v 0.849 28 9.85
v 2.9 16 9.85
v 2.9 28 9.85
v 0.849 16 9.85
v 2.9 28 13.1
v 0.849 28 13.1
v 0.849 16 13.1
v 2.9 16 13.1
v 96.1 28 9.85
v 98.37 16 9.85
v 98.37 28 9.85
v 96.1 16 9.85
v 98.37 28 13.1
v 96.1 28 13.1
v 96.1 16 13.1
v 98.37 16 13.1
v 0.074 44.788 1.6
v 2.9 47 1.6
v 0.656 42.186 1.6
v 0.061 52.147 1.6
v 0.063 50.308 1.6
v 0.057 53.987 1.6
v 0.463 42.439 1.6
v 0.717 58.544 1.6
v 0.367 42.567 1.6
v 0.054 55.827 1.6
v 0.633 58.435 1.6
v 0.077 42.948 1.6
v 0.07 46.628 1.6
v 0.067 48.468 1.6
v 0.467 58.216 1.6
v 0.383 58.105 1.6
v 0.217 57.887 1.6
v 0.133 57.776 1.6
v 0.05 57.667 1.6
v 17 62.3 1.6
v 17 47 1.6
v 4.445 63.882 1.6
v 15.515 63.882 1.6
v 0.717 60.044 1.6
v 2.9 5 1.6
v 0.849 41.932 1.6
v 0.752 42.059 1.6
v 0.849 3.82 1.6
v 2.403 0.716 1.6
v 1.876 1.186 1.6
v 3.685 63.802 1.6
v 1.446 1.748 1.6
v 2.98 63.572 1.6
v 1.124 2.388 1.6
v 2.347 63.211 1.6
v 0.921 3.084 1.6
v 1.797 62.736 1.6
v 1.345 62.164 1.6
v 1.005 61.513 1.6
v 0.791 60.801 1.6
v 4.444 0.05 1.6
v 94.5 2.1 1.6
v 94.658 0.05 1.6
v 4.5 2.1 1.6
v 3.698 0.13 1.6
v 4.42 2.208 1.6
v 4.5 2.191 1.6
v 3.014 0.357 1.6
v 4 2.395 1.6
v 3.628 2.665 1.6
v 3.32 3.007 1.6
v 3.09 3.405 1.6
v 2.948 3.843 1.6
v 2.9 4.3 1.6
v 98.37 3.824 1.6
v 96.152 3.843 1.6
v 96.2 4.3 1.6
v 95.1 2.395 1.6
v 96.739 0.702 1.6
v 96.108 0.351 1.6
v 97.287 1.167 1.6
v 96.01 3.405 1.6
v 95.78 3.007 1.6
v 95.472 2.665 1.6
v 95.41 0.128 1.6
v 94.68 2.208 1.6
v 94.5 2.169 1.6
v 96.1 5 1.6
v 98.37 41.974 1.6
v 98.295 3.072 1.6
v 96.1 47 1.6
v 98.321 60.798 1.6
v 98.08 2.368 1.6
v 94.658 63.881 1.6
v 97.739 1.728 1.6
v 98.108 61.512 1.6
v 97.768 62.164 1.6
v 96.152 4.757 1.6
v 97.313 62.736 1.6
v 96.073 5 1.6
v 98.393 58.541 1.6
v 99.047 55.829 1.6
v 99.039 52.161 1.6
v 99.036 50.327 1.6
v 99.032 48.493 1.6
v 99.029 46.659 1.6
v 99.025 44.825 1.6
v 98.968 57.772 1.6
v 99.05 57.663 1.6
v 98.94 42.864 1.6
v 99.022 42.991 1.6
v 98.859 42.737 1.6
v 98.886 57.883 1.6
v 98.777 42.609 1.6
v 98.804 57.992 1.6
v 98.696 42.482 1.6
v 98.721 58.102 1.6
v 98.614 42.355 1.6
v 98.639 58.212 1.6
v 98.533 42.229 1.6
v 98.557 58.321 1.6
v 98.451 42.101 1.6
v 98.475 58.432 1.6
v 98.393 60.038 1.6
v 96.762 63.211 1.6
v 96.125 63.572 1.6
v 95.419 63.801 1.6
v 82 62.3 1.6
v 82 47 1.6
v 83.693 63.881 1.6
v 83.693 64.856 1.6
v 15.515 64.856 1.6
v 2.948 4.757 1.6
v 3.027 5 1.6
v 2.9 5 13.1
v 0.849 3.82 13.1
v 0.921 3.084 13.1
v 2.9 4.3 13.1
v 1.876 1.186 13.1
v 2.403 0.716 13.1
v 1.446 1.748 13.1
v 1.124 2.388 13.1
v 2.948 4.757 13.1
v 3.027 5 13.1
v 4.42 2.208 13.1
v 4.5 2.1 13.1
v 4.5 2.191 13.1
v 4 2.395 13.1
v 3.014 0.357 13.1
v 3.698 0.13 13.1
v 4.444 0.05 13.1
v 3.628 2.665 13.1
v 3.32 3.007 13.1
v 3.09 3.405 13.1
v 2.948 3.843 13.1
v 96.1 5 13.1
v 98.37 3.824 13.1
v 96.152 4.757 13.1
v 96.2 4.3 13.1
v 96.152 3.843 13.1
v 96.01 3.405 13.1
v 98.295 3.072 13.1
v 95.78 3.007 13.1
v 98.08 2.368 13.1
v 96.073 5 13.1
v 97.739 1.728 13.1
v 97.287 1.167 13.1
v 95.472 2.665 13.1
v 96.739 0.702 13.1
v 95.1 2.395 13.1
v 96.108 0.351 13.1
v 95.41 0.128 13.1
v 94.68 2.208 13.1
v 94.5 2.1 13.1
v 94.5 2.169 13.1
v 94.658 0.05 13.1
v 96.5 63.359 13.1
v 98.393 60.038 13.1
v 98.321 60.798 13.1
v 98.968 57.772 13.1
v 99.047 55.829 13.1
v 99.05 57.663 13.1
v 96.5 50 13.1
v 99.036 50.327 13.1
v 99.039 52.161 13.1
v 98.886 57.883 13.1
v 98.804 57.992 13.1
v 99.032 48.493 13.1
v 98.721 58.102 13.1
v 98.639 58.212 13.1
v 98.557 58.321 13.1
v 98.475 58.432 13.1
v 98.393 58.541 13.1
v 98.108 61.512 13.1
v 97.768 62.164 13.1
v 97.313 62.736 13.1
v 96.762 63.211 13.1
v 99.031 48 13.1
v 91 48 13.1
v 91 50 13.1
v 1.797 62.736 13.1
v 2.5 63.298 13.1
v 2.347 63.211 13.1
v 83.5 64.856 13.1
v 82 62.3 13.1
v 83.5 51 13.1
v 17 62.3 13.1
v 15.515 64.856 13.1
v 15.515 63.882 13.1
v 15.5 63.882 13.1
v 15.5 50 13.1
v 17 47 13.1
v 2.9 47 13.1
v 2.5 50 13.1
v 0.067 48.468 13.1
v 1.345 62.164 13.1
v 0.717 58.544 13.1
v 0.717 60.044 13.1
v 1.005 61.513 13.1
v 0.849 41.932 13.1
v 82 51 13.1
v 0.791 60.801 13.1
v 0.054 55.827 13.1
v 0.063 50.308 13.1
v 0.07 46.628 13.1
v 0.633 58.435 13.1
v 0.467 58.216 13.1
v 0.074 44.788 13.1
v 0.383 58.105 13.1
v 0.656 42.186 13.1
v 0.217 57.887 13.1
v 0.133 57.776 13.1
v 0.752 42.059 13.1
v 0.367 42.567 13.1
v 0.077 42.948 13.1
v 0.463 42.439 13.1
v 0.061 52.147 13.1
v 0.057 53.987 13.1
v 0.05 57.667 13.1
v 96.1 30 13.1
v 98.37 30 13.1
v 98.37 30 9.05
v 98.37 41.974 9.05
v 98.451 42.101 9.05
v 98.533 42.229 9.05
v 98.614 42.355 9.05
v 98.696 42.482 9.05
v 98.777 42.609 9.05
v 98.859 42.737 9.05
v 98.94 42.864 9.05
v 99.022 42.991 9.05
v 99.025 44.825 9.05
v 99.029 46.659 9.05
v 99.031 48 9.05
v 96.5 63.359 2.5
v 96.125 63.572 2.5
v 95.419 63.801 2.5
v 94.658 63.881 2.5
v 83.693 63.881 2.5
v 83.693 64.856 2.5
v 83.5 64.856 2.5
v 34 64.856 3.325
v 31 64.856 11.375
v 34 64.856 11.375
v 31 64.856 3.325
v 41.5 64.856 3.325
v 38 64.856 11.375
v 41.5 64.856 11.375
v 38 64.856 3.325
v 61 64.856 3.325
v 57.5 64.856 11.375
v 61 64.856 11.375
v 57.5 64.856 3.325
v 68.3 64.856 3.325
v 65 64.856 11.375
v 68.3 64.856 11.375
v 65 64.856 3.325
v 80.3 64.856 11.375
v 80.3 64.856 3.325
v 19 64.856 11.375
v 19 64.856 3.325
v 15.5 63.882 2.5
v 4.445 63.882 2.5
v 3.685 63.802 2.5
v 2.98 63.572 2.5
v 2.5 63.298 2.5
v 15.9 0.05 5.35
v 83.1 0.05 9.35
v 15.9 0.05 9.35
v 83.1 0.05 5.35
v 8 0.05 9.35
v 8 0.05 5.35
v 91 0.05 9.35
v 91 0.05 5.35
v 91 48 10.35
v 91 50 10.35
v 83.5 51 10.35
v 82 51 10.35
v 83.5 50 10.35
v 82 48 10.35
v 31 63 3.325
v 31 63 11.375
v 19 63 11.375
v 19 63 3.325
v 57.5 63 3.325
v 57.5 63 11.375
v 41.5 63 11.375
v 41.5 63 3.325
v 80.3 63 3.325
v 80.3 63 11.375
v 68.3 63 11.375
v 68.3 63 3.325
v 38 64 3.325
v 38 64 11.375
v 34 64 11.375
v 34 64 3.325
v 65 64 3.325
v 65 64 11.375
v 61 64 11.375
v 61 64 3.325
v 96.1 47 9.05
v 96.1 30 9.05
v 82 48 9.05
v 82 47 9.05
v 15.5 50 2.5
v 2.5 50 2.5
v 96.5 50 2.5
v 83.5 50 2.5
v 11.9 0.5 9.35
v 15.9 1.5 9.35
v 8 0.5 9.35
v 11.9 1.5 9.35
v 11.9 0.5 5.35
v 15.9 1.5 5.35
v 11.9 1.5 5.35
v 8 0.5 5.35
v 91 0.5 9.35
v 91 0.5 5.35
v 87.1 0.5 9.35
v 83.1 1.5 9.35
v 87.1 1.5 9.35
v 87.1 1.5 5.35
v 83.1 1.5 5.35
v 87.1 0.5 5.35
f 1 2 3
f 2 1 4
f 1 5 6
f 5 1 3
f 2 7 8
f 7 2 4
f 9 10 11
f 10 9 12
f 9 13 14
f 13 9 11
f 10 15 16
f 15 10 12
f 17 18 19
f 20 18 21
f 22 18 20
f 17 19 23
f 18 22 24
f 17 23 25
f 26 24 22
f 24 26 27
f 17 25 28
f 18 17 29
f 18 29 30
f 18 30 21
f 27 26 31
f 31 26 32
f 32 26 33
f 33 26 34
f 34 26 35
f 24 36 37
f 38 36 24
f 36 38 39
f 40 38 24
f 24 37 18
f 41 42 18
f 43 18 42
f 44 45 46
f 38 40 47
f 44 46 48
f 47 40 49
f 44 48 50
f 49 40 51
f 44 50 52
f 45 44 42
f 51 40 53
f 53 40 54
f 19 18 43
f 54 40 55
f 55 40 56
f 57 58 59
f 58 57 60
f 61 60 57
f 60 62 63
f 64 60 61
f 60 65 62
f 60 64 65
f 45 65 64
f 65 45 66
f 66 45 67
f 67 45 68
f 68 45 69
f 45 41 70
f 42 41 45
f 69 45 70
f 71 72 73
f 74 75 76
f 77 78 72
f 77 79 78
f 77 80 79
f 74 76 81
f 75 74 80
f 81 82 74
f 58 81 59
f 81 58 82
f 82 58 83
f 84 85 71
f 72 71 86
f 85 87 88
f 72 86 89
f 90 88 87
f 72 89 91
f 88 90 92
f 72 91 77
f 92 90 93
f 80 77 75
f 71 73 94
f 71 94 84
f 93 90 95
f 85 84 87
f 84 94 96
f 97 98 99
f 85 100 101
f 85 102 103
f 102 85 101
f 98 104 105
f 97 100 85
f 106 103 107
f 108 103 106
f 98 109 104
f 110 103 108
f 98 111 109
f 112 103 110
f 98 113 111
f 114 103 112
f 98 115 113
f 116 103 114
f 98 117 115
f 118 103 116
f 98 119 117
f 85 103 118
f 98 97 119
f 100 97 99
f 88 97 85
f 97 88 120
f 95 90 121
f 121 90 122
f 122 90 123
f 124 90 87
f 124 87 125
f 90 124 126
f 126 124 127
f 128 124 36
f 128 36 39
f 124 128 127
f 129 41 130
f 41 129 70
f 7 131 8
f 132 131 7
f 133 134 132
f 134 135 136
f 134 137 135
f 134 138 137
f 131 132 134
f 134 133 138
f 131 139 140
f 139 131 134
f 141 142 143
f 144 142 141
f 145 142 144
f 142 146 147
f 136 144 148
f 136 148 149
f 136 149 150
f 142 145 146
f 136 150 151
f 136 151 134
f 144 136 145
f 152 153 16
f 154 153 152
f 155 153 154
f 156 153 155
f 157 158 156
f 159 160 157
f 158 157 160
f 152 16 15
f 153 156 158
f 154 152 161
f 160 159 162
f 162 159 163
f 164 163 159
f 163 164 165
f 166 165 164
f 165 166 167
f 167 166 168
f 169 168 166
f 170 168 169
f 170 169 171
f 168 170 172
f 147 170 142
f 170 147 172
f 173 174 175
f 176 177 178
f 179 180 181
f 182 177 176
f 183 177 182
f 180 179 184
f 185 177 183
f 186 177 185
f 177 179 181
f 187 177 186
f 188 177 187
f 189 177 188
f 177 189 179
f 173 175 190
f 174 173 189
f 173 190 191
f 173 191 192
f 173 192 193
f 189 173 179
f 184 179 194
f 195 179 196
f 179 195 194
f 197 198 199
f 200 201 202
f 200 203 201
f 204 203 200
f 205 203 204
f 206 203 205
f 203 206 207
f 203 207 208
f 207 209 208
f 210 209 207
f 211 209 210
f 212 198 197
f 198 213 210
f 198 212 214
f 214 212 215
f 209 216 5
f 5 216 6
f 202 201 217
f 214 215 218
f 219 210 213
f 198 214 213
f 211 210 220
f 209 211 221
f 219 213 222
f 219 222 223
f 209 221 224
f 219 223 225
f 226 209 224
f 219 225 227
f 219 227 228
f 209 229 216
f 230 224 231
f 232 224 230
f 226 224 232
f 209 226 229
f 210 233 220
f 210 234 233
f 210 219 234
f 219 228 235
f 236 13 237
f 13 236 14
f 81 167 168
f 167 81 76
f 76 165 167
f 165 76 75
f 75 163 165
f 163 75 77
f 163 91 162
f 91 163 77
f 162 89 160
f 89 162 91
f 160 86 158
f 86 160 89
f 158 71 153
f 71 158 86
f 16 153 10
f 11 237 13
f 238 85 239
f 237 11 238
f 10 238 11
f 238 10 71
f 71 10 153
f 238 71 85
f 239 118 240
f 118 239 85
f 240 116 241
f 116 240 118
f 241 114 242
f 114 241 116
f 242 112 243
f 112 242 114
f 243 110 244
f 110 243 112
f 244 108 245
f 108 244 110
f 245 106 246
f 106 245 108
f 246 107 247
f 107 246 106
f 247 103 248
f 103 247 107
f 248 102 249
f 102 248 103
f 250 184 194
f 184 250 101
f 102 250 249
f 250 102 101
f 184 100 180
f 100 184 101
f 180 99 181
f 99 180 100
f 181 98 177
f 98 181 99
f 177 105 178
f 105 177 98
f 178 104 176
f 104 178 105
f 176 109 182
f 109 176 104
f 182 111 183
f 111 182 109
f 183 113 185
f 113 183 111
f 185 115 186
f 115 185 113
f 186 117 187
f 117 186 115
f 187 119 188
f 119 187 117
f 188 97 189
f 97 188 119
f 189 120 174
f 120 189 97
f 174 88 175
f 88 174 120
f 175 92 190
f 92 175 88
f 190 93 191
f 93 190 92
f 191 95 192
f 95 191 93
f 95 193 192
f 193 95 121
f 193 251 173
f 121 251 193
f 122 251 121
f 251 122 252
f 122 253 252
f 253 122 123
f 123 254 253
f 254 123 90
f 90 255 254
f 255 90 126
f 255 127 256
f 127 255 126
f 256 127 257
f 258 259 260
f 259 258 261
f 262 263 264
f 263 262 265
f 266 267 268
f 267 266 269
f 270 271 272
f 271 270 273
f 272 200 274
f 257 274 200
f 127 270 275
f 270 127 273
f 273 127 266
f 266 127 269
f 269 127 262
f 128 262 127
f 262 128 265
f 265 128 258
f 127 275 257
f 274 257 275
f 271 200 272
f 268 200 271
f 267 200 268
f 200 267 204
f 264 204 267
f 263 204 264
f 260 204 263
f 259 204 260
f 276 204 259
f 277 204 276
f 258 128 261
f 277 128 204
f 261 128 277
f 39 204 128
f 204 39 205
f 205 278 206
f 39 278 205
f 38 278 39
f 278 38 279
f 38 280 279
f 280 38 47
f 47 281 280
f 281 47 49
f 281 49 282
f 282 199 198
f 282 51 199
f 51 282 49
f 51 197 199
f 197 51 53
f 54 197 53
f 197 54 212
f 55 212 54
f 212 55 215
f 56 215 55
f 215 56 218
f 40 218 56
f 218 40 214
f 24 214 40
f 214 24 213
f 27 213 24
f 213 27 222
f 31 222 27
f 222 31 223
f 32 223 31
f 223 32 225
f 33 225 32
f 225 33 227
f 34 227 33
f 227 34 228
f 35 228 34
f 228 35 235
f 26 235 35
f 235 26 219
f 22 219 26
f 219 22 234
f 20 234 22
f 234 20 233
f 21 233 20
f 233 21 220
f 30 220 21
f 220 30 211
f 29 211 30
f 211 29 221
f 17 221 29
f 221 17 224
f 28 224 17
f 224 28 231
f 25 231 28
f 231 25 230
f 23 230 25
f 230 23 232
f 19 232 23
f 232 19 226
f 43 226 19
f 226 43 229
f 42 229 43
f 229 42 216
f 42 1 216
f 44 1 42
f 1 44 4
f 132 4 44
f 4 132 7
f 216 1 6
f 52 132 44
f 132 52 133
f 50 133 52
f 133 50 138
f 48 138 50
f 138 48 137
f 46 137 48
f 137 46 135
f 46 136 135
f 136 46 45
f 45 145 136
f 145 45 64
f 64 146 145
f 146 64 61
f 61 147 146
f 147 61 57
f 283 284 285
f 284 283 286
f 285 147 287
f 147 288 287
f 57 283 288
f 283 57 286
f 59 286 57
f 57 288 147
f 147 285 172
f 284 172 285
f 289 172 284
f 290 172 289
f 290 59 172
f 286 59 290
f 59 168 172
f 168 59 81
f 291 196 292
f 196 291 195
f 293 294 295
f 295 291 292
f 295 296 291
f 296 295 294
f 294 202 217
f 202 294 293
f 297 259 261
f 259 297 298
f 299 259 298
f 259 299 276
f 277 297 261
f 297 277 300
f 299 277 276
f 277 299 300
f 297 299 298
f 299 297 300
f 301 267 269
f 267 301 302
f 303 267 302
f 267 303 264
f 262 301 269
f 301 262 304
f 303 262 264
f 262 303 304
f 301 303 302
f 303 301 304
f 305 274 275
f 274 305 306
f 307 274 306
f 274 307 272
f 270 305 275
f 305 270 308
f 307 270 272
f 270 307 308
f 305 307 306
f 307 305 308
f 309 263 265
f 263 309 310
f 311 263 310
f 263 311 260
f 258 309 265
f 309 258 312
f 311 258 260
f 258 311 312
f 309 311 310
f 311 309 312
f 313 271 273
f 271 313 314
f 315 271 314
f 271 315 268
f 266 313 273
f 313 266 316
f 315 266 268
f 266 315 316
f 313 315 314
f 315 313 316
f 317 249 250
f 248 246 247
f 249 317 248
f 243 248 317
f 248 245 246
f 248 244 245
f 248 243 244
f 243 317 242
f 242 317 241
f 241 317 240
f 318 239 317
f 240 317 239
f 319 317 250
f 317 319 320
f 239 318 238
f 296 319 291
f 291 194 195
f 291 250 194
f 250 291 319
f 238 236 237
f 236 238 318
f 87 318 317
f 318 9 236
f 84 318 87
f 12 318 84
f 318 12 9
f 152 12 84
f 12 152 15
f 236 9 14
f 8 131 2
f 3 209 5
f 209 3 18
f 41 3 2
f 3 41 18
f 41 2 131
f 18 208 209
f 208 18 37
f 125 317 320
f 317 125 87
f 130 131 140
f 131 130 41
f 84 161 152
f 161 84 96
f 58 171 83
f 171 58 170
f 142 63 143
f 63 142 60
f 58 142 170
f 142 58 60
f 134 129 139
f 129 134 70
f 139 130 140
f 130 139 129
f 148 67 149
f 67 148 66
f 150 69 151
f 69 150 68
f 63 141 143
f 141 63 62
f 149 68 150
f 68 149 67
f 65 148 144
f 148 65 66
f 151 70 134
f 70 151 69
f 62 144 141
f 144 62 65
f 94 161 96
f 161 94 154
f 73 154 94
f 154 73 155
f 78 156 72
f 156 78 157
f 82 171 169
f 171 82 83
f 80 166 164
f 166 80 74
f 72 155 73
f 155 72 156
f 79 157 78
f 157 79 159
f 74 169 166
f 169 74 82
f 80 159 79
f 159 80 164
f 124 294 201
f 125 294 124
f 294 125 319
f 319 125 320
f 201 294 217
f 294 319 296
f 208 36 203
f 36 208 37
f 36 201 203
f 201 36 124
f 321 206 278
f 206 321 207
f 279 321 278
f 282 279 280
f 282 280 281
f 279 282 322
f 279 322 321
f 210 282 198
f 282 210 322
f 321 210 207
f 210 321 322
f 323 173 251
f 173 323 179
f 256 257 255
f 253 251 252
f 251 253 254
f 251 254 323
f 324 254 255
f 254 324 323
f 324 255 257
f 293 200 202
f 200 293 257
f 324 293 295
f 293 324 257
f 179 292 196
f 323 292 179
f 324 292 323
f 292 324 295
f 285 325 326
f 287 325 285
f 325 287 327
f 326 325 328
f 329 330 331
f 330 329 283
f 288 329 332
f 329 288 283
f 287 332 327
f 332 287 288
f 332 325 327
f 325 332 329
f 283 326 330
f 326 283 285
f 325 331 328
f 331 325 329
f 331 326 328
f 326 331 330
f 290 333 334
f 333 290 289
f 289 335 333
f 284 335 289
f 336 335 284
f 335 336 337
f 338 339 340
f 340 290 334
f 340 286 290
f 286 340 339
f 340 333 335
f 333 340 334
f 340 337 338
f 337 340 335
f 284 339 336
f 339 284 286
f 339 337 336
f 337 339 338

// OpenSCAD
////// MixTape 3d Printed Case///////////////////////////

// thanks for adding the wall thickness, Philip!

// 

plugHeight = 10.6; // [6:11]
tapeHeight = 11.5; //
topThickness = 1.6; 
screwHoleSize = 1;

bottom_wall_thickness = 2;

usb_charger = false;
cutout_aux_ports = true;
volume_wheel = true;
screws_port = false;

//rotate([55,0,$t*380]) translate([-50,0,0]){
rotate([0,0,0]) translate([0,0,0]){
//PCB();
//parts();

difference(){
    
    union(){
        tapeBody_screws();
        //tapeTop_screws();
        //FullCase();
    }
    
    // Plugs 
    translate([2.5,50,tapeHeight-plugHeight+topThickness]) cube([13,20,plugHeight+1],false); 
    translate([83.5,50,tapeHeight-plugHeight+topThickness]) cube([13,20,plugHeight+1],false);
    
    // write protectors 
    translate([10,0,0.5*tapeHeight+1.6]) cube([4,1,4],true);
    translate([13.9,0,0.5*tapeHeight+1.6]) cube([4,3,4],true);
    translate([89,0,0.5*tapeHeight+1.6]) cube([4,1,4],true);
    translate([85.1,0,0.5*tapeHeight+1.6]) cube([4,3,4],true);

    // Power signs
    //if (!usb_charger) {
    //    translate([41,0,0.5*tapeHeight+1.6]) cube([4,1.5,1],true);
    //    translate([41,0,0.5*tapeHeight+1.6]) cube([1,1.5,4],true);
    
    //    translate([58,0,0.5*tapeHeight+1.6]) cube([4,1.5,1],true); 
    //}
}
}


module tapeBody_screws(){
    
    difference(){
        tapeBody();
        //screwHolebtop();
        //screwHolebottom();
        //speakerHole();
    }
}   
module tapeTop_screws(){
    difference(){
        tapeTop();
        screwHolebtopcover();
        screwHolebtop();
        screwHolebottom();
    }    
}   


// Modules ///////////////////////////////

module speakerHole(){   
    translate([0,18,tapeHeight/2 + topThickness])    
    for(z=[-180:45:+180])
      for(x=[4:3:12])
        rotate([90,z,90]) translate([x*0.45,0,0]) cylinder(h=10, r=0.4, $fn=30);
}


module PCB(){
color("DarkKhaki") 
translate ([0,0,tapeHeight+1.6]) linear_extrude(height = 1.6, center = false, convexity = 10, twist = 0) import("mixtape_case_3D_bottom.dxf", convexity=3);
color("Gold") 
translate ([0,0,tapeHeight+3.2]) linear_extrude(height = 0.2, center = false, convexity = 10, twist = 0) import("mixtape_case_3D_PCB.dxf", convexity=3);

color("DarkKhaki") 
translate ([0,0,tapeHeight+2*topThickness]) linear_extrude(height = 1.6, center = false, convexity = 10, twist = 0) import("mixtape_case_3D_PCB_TrapezBoard.dxf", convexity=3);
color("Gold") 
translate ([0,0,tapeHeight+3*topThickness]) linear_extrude(height = 0.2, center = false, convexity = 10, twist = 0) import("mixtape_case_3D_PCB_TrapezCircuit.dxf", convexity=3);
}

module tapeBody(){ 
    difference(){
        union(){
            difference(){ 
                //color("Deeppink") 
                translate ([0,0,1.6]) linear_extrude(height = tapeHeight, center = false, convexity = 10, twist = 0) import("mixtape_case_3D_bottom.dxf", convexity=3);  

                //if (!usb_charger) {
                    //translate ([0,0,0.6]) linear_extrude(height = tapeHeight+4, center = false, convexity = 10, twist = 0) import("mixtape_case_3D_MainCase.dxf", convexity=3);
                //} else {
                    //translate ([0,0,0.6]) linear_extrude(height = tapeHeight+4, center = false, convexity = 10, twist = 0) import("mixtape_case_3D_MainCase_USB.dxf", convexity=3);
                //}
                // cut out for SMD parts below
            translate([86,48,1*tapeHeight+topThickness+3]) cube([10,6,tapeHeight],true);
                
                //Face holes
                translate([25,64,0.5*tapeHeight+topThickness]) cube([12,2,0.7*tapeHeight],true);
                if (!usb_charger) { 
                    translate([49.5,64,0.5*tapeHeight+topThickness]) cube([16,2,0.7*tapeHeight],true); 
                }
                translate([74.3,64,0.5*tapeHeight+topThickness]) cube([12,2,0.7*tapeHeight],true);

                translate([36,65,0.5*tapeHeight+topThickness]) cube([4,2,0.7*tapeHeight],true);
                translate([63,65,0.5*tapeHeight+topThickness]) cube([4,2,0.7*tapeHeight],true);

                if (usb_charger) {
                    // cutout usb port
                    translate([49.5,64,0.5*tapeHeight+topThickness+3])cube([20,14,0.7*tapeHeight+4],true);
                }

                // Side Aux Ports
                if (cutout_aux_ports) {
                   translate([1.5,22,0.8*tapeHeight+topThickness+4.8]) cube([20,12,tapeHeight],true);
                   translate([90,22,0.8*tapeHeight+topThickness+4.8]) cube([20,12,tapeHeight],true);      
                }
                
                // Volume Wheel
                if (volume_wheel) {
                    translate([90,39,0.8*tapeHeight+topThickness+4]) cube([20,18,tapeHeight],true);      
                }
            }
            translate([49.5,7.05,0.5*tapeHeight+topThickness]) cube([90,14,1*tapeHeight],true);
            
        } //end union
        
        
    // wall thickness
        translate([49.5,24+bottom_wall_thickness,0.5*tapeHeight+topThickness-1]) cube([93.2,42,1*tapeHeight+7],true);
        
    translate([49.5,1.8+bottom_wall_thickness,0.5*tapeHeight+topThickness-1]) cube([90,3.4,1*tapeHeight+7],true);
    
    translate([5.1, 4.3 + 0, tapeHeight+topThickness-(tapeHeight)-1   ]) cylinder(h=tapeHeight*1.5, r=2.2, center=false, ,$fn=30);
    translate([94, 4.3 + 0, tapeHeight+topThickness-(tapeHeight)-1   ]) cylinder(h=tapeHeight*1.5, r=2.2, center=false, ,$fn=30);  
        
        translate([49.5,40+bottom_wall_thickness+2.8,0.5*tapeHeight+topThickness-1]) cube([65,35,0.7*tapeHeight+7],true);
    } // end difference
    
    
    
    //color("DarkKhaki") 
    if (!usb_charger) {
    //translate([40,0.05,1.6]) cube([20,10,2.5],false);
    }
    
    //screw left
    if (screws_port){
  translate([4 - 0 , 46.640 + 0, tapeHeight+topThickness-(tapeHeight)   ]) cylinder(h=tapeHeight*1, r=2.8, center=false, ,$fn=30);   
  translate([95 - 0 , 46.640 + 0, tapeHeight+topThickness-(tapeHeight)   ]) cylinder(h=tapeHeight*1, r=2.8, center=false, ,$fn=30); 
  translate([4 - 0 , 2.80 + 0, tapeHeight+topThickness-(tapeHeight)   ]) cylinder(h=tapeHeight*1, r=2.5, center=false, ,$fn=30);   
  translate([95 - 0 , 2.80 + 0, tapeHeight+topThickness-(tapeHeight)   ]) cylinder(h=tapeHeight*1, r=2.5, center=false, ,$fn=30); 
    }
}


module screwHolebottom(){
  translate([4 - 0 , 3 + 0, 0  ]) cylinder(h=tapeHeight*4.1, r=screwHoleSize, center=true, ,$fn=30);
  translate([95 - 0 , 3 + 0, 0  ]) cylinder(h=tapeHeight*4.1, r=screwHoleSize, center=true, ,$fn=30);
}

module screwHolebtop(){
  //screw left
  translate([4.586 - 0 , 46.640 + 0, 0  ]) cylinder(h=11*4.1, r=screwHoleSize, center=true, ,$fn=30);
  //screw right
  translate([94.998 - 0 , 46.640 + 0, 0  ]) cylinder(h=11*4.1, r=screwHoleSize, center=true, ,$fn=30);
}


module screwHolebtopcover(){   
  //screw top left
  translate([4.586 - 0 , 46.640 + 0, 0+0-(0) - 0.0  ]) cylinder(h=topThickness*0.5, r=1.8, center=true, ,$fn=30);
  //screw top right
  translate([94.998 - 0 , 46.640 + 0, 0 - 0.0  ]) cylinder(h=topThickness*0.5, r=1.8, center=true, ,$fn=30); 

  //screw lower left
  translate([4 - 0 , 3 + 0, 0+0-(0) - 0.0  ]) cylinder(h=topThickness*0.5, r=1.8, center=true, ,$fn=30);
  //screw lower right
  translate([95 - 0 , 3 + 0, 0 - 0.0  ]) cylinder(h=topThickness*0.5, r=1.8, center=true, ,$fn=30);     
    
}


module tapeTop(){ 
 
difference(){ 
 color("Deeppink") 
     translate ([0,0,-1.5]) linear_extrude(height = 1.5, center = false, convexity = 10, twist = 0) import("mixtape_case_3D_TopTrapez.dxf", convexity=3);
     
   color("Gold") 
     translate ([0,0,-2.2]) linear_extrude(height = 3, center = false, convexity = 10, twist = 0) import("mixtape_case_3D_Holes.dxf", convexity=3);
   translate([50,53,-2.2]) cylinder(h=1.2, r=1.3, center=false, ,$fn=30);
}   
    

difference(){    
  color("Deeppink") 
     translate ([0,0,0]) linear_extrude(height = 1.6, center = false, convexity = 10, twist = 0) import("mixtape_case_3D_bottom.dxf", convexity=3);

  translate([4,3,-1]) cylinder(h=1.5, r=1.3, center=false, ,$fn=30);
  translate([95,3,-1]) cylinder(h=1.5, r=1.3, center=false, ,$fn=30);
  translate([4,61,-1]) cylinder(h=1.5, r=1.3, center=false, ,$fn=30);
  translate([95,61,-1]) cylinder(h=1.5, r=1.3, center=false, ,$fn=30);
    
  color("Pink") 
     translate ([0,0,-1.3]) linear_extrude(height = 2, center = false, convexity = 10, twist = 0) import("mixtape_case_3D_WindowRect.dxf", convexity=3); 
    
  difference(){    
  color("Gold") 
     translate ([0,0,-0.5]) linear_extrude(height = 1, center = false, convexity = 10, twist = 0) import("mixtape_case_3D_BigRect.dxf", convexity=3);  
  

  translate ([0,0,-3]) linear_extrude(height = 10, center = false, convexity = 10, twist = 0) import("mixtape_case_3D_MidRect.dxf", convexity=3);   
  }
  
  translate ([0,0,-3]) linear_extrude(height = 5.5, center = false, convexity = 10, twist = 0) import("mixtape_case_3D_Wheels.dxf", convexity=3); 
}

  translate ([0,0,0.4]) linear_extrude(height = 1.2, center = false, convexity = 10, twist = 0) import("mixtape_case_3D_NutWheels.dxf", convexity=3); 

}
 

module parts(){
    // IC-Socket
  color("Grey")
      translate([44,22.5,tapeHeight+2*topThickness]) cube([11,13,4],false);
    
  difference(){
  color("Black")
      translate([45,23.5,tapeHeight+2*topThickness]) cube([9,11,7],false);
        
    translate([49.5,34.5,tapeHeight+2*topThickness+6]) cylinder(h=10, r=1.5, center=false, ,$fn=30);
    }
    
    // NEO-Pixels
    for (a = [ 0 : 6.3 : 46 ])
    translate([a,0,0]) NEOpixel();
    
    module NEOpixel(){
    color("White")
      translate([25.2,52.5,tapeHeight+3*topThickness]) cube([5,5,2],false);
        
    color("Deeppink")
      translate([27.7,55,tapeHeight+3*topThickness]) cylinder(h=2.5, r=2, center=false, ,$fn=30);
    }
    
    // Pots
    potentiometer();
    translate ([42,0,0]) potentiometer();
    
    module potentiometer(){
    color("Grey")
      translate([29,29,tapeHeight+2*topThickness]) cylinder(h=10, r=3.5, center=false, ,$fn=30);
    
    color("Deeppink")
        translate([29,29,tapeHeight+2*topThickness+2]) cylinder(h=12, r1=6, r2=4.5, center=false, ,$fn=30);
    }
    
    // Buttons
    button();
    translate ([58,0,0]) button();
    
    module button(){
    color("Grey")
      translate([17.5,9.8,tapeHeight+2*topThickness]) cube([6,6,3],false);
        
    color("Red")
      translate([20.5,12.8,tapeHeight+2*topThickness]) cylinder(h=5, r=1.5, center=false, ,$fn=30);
    }

}
